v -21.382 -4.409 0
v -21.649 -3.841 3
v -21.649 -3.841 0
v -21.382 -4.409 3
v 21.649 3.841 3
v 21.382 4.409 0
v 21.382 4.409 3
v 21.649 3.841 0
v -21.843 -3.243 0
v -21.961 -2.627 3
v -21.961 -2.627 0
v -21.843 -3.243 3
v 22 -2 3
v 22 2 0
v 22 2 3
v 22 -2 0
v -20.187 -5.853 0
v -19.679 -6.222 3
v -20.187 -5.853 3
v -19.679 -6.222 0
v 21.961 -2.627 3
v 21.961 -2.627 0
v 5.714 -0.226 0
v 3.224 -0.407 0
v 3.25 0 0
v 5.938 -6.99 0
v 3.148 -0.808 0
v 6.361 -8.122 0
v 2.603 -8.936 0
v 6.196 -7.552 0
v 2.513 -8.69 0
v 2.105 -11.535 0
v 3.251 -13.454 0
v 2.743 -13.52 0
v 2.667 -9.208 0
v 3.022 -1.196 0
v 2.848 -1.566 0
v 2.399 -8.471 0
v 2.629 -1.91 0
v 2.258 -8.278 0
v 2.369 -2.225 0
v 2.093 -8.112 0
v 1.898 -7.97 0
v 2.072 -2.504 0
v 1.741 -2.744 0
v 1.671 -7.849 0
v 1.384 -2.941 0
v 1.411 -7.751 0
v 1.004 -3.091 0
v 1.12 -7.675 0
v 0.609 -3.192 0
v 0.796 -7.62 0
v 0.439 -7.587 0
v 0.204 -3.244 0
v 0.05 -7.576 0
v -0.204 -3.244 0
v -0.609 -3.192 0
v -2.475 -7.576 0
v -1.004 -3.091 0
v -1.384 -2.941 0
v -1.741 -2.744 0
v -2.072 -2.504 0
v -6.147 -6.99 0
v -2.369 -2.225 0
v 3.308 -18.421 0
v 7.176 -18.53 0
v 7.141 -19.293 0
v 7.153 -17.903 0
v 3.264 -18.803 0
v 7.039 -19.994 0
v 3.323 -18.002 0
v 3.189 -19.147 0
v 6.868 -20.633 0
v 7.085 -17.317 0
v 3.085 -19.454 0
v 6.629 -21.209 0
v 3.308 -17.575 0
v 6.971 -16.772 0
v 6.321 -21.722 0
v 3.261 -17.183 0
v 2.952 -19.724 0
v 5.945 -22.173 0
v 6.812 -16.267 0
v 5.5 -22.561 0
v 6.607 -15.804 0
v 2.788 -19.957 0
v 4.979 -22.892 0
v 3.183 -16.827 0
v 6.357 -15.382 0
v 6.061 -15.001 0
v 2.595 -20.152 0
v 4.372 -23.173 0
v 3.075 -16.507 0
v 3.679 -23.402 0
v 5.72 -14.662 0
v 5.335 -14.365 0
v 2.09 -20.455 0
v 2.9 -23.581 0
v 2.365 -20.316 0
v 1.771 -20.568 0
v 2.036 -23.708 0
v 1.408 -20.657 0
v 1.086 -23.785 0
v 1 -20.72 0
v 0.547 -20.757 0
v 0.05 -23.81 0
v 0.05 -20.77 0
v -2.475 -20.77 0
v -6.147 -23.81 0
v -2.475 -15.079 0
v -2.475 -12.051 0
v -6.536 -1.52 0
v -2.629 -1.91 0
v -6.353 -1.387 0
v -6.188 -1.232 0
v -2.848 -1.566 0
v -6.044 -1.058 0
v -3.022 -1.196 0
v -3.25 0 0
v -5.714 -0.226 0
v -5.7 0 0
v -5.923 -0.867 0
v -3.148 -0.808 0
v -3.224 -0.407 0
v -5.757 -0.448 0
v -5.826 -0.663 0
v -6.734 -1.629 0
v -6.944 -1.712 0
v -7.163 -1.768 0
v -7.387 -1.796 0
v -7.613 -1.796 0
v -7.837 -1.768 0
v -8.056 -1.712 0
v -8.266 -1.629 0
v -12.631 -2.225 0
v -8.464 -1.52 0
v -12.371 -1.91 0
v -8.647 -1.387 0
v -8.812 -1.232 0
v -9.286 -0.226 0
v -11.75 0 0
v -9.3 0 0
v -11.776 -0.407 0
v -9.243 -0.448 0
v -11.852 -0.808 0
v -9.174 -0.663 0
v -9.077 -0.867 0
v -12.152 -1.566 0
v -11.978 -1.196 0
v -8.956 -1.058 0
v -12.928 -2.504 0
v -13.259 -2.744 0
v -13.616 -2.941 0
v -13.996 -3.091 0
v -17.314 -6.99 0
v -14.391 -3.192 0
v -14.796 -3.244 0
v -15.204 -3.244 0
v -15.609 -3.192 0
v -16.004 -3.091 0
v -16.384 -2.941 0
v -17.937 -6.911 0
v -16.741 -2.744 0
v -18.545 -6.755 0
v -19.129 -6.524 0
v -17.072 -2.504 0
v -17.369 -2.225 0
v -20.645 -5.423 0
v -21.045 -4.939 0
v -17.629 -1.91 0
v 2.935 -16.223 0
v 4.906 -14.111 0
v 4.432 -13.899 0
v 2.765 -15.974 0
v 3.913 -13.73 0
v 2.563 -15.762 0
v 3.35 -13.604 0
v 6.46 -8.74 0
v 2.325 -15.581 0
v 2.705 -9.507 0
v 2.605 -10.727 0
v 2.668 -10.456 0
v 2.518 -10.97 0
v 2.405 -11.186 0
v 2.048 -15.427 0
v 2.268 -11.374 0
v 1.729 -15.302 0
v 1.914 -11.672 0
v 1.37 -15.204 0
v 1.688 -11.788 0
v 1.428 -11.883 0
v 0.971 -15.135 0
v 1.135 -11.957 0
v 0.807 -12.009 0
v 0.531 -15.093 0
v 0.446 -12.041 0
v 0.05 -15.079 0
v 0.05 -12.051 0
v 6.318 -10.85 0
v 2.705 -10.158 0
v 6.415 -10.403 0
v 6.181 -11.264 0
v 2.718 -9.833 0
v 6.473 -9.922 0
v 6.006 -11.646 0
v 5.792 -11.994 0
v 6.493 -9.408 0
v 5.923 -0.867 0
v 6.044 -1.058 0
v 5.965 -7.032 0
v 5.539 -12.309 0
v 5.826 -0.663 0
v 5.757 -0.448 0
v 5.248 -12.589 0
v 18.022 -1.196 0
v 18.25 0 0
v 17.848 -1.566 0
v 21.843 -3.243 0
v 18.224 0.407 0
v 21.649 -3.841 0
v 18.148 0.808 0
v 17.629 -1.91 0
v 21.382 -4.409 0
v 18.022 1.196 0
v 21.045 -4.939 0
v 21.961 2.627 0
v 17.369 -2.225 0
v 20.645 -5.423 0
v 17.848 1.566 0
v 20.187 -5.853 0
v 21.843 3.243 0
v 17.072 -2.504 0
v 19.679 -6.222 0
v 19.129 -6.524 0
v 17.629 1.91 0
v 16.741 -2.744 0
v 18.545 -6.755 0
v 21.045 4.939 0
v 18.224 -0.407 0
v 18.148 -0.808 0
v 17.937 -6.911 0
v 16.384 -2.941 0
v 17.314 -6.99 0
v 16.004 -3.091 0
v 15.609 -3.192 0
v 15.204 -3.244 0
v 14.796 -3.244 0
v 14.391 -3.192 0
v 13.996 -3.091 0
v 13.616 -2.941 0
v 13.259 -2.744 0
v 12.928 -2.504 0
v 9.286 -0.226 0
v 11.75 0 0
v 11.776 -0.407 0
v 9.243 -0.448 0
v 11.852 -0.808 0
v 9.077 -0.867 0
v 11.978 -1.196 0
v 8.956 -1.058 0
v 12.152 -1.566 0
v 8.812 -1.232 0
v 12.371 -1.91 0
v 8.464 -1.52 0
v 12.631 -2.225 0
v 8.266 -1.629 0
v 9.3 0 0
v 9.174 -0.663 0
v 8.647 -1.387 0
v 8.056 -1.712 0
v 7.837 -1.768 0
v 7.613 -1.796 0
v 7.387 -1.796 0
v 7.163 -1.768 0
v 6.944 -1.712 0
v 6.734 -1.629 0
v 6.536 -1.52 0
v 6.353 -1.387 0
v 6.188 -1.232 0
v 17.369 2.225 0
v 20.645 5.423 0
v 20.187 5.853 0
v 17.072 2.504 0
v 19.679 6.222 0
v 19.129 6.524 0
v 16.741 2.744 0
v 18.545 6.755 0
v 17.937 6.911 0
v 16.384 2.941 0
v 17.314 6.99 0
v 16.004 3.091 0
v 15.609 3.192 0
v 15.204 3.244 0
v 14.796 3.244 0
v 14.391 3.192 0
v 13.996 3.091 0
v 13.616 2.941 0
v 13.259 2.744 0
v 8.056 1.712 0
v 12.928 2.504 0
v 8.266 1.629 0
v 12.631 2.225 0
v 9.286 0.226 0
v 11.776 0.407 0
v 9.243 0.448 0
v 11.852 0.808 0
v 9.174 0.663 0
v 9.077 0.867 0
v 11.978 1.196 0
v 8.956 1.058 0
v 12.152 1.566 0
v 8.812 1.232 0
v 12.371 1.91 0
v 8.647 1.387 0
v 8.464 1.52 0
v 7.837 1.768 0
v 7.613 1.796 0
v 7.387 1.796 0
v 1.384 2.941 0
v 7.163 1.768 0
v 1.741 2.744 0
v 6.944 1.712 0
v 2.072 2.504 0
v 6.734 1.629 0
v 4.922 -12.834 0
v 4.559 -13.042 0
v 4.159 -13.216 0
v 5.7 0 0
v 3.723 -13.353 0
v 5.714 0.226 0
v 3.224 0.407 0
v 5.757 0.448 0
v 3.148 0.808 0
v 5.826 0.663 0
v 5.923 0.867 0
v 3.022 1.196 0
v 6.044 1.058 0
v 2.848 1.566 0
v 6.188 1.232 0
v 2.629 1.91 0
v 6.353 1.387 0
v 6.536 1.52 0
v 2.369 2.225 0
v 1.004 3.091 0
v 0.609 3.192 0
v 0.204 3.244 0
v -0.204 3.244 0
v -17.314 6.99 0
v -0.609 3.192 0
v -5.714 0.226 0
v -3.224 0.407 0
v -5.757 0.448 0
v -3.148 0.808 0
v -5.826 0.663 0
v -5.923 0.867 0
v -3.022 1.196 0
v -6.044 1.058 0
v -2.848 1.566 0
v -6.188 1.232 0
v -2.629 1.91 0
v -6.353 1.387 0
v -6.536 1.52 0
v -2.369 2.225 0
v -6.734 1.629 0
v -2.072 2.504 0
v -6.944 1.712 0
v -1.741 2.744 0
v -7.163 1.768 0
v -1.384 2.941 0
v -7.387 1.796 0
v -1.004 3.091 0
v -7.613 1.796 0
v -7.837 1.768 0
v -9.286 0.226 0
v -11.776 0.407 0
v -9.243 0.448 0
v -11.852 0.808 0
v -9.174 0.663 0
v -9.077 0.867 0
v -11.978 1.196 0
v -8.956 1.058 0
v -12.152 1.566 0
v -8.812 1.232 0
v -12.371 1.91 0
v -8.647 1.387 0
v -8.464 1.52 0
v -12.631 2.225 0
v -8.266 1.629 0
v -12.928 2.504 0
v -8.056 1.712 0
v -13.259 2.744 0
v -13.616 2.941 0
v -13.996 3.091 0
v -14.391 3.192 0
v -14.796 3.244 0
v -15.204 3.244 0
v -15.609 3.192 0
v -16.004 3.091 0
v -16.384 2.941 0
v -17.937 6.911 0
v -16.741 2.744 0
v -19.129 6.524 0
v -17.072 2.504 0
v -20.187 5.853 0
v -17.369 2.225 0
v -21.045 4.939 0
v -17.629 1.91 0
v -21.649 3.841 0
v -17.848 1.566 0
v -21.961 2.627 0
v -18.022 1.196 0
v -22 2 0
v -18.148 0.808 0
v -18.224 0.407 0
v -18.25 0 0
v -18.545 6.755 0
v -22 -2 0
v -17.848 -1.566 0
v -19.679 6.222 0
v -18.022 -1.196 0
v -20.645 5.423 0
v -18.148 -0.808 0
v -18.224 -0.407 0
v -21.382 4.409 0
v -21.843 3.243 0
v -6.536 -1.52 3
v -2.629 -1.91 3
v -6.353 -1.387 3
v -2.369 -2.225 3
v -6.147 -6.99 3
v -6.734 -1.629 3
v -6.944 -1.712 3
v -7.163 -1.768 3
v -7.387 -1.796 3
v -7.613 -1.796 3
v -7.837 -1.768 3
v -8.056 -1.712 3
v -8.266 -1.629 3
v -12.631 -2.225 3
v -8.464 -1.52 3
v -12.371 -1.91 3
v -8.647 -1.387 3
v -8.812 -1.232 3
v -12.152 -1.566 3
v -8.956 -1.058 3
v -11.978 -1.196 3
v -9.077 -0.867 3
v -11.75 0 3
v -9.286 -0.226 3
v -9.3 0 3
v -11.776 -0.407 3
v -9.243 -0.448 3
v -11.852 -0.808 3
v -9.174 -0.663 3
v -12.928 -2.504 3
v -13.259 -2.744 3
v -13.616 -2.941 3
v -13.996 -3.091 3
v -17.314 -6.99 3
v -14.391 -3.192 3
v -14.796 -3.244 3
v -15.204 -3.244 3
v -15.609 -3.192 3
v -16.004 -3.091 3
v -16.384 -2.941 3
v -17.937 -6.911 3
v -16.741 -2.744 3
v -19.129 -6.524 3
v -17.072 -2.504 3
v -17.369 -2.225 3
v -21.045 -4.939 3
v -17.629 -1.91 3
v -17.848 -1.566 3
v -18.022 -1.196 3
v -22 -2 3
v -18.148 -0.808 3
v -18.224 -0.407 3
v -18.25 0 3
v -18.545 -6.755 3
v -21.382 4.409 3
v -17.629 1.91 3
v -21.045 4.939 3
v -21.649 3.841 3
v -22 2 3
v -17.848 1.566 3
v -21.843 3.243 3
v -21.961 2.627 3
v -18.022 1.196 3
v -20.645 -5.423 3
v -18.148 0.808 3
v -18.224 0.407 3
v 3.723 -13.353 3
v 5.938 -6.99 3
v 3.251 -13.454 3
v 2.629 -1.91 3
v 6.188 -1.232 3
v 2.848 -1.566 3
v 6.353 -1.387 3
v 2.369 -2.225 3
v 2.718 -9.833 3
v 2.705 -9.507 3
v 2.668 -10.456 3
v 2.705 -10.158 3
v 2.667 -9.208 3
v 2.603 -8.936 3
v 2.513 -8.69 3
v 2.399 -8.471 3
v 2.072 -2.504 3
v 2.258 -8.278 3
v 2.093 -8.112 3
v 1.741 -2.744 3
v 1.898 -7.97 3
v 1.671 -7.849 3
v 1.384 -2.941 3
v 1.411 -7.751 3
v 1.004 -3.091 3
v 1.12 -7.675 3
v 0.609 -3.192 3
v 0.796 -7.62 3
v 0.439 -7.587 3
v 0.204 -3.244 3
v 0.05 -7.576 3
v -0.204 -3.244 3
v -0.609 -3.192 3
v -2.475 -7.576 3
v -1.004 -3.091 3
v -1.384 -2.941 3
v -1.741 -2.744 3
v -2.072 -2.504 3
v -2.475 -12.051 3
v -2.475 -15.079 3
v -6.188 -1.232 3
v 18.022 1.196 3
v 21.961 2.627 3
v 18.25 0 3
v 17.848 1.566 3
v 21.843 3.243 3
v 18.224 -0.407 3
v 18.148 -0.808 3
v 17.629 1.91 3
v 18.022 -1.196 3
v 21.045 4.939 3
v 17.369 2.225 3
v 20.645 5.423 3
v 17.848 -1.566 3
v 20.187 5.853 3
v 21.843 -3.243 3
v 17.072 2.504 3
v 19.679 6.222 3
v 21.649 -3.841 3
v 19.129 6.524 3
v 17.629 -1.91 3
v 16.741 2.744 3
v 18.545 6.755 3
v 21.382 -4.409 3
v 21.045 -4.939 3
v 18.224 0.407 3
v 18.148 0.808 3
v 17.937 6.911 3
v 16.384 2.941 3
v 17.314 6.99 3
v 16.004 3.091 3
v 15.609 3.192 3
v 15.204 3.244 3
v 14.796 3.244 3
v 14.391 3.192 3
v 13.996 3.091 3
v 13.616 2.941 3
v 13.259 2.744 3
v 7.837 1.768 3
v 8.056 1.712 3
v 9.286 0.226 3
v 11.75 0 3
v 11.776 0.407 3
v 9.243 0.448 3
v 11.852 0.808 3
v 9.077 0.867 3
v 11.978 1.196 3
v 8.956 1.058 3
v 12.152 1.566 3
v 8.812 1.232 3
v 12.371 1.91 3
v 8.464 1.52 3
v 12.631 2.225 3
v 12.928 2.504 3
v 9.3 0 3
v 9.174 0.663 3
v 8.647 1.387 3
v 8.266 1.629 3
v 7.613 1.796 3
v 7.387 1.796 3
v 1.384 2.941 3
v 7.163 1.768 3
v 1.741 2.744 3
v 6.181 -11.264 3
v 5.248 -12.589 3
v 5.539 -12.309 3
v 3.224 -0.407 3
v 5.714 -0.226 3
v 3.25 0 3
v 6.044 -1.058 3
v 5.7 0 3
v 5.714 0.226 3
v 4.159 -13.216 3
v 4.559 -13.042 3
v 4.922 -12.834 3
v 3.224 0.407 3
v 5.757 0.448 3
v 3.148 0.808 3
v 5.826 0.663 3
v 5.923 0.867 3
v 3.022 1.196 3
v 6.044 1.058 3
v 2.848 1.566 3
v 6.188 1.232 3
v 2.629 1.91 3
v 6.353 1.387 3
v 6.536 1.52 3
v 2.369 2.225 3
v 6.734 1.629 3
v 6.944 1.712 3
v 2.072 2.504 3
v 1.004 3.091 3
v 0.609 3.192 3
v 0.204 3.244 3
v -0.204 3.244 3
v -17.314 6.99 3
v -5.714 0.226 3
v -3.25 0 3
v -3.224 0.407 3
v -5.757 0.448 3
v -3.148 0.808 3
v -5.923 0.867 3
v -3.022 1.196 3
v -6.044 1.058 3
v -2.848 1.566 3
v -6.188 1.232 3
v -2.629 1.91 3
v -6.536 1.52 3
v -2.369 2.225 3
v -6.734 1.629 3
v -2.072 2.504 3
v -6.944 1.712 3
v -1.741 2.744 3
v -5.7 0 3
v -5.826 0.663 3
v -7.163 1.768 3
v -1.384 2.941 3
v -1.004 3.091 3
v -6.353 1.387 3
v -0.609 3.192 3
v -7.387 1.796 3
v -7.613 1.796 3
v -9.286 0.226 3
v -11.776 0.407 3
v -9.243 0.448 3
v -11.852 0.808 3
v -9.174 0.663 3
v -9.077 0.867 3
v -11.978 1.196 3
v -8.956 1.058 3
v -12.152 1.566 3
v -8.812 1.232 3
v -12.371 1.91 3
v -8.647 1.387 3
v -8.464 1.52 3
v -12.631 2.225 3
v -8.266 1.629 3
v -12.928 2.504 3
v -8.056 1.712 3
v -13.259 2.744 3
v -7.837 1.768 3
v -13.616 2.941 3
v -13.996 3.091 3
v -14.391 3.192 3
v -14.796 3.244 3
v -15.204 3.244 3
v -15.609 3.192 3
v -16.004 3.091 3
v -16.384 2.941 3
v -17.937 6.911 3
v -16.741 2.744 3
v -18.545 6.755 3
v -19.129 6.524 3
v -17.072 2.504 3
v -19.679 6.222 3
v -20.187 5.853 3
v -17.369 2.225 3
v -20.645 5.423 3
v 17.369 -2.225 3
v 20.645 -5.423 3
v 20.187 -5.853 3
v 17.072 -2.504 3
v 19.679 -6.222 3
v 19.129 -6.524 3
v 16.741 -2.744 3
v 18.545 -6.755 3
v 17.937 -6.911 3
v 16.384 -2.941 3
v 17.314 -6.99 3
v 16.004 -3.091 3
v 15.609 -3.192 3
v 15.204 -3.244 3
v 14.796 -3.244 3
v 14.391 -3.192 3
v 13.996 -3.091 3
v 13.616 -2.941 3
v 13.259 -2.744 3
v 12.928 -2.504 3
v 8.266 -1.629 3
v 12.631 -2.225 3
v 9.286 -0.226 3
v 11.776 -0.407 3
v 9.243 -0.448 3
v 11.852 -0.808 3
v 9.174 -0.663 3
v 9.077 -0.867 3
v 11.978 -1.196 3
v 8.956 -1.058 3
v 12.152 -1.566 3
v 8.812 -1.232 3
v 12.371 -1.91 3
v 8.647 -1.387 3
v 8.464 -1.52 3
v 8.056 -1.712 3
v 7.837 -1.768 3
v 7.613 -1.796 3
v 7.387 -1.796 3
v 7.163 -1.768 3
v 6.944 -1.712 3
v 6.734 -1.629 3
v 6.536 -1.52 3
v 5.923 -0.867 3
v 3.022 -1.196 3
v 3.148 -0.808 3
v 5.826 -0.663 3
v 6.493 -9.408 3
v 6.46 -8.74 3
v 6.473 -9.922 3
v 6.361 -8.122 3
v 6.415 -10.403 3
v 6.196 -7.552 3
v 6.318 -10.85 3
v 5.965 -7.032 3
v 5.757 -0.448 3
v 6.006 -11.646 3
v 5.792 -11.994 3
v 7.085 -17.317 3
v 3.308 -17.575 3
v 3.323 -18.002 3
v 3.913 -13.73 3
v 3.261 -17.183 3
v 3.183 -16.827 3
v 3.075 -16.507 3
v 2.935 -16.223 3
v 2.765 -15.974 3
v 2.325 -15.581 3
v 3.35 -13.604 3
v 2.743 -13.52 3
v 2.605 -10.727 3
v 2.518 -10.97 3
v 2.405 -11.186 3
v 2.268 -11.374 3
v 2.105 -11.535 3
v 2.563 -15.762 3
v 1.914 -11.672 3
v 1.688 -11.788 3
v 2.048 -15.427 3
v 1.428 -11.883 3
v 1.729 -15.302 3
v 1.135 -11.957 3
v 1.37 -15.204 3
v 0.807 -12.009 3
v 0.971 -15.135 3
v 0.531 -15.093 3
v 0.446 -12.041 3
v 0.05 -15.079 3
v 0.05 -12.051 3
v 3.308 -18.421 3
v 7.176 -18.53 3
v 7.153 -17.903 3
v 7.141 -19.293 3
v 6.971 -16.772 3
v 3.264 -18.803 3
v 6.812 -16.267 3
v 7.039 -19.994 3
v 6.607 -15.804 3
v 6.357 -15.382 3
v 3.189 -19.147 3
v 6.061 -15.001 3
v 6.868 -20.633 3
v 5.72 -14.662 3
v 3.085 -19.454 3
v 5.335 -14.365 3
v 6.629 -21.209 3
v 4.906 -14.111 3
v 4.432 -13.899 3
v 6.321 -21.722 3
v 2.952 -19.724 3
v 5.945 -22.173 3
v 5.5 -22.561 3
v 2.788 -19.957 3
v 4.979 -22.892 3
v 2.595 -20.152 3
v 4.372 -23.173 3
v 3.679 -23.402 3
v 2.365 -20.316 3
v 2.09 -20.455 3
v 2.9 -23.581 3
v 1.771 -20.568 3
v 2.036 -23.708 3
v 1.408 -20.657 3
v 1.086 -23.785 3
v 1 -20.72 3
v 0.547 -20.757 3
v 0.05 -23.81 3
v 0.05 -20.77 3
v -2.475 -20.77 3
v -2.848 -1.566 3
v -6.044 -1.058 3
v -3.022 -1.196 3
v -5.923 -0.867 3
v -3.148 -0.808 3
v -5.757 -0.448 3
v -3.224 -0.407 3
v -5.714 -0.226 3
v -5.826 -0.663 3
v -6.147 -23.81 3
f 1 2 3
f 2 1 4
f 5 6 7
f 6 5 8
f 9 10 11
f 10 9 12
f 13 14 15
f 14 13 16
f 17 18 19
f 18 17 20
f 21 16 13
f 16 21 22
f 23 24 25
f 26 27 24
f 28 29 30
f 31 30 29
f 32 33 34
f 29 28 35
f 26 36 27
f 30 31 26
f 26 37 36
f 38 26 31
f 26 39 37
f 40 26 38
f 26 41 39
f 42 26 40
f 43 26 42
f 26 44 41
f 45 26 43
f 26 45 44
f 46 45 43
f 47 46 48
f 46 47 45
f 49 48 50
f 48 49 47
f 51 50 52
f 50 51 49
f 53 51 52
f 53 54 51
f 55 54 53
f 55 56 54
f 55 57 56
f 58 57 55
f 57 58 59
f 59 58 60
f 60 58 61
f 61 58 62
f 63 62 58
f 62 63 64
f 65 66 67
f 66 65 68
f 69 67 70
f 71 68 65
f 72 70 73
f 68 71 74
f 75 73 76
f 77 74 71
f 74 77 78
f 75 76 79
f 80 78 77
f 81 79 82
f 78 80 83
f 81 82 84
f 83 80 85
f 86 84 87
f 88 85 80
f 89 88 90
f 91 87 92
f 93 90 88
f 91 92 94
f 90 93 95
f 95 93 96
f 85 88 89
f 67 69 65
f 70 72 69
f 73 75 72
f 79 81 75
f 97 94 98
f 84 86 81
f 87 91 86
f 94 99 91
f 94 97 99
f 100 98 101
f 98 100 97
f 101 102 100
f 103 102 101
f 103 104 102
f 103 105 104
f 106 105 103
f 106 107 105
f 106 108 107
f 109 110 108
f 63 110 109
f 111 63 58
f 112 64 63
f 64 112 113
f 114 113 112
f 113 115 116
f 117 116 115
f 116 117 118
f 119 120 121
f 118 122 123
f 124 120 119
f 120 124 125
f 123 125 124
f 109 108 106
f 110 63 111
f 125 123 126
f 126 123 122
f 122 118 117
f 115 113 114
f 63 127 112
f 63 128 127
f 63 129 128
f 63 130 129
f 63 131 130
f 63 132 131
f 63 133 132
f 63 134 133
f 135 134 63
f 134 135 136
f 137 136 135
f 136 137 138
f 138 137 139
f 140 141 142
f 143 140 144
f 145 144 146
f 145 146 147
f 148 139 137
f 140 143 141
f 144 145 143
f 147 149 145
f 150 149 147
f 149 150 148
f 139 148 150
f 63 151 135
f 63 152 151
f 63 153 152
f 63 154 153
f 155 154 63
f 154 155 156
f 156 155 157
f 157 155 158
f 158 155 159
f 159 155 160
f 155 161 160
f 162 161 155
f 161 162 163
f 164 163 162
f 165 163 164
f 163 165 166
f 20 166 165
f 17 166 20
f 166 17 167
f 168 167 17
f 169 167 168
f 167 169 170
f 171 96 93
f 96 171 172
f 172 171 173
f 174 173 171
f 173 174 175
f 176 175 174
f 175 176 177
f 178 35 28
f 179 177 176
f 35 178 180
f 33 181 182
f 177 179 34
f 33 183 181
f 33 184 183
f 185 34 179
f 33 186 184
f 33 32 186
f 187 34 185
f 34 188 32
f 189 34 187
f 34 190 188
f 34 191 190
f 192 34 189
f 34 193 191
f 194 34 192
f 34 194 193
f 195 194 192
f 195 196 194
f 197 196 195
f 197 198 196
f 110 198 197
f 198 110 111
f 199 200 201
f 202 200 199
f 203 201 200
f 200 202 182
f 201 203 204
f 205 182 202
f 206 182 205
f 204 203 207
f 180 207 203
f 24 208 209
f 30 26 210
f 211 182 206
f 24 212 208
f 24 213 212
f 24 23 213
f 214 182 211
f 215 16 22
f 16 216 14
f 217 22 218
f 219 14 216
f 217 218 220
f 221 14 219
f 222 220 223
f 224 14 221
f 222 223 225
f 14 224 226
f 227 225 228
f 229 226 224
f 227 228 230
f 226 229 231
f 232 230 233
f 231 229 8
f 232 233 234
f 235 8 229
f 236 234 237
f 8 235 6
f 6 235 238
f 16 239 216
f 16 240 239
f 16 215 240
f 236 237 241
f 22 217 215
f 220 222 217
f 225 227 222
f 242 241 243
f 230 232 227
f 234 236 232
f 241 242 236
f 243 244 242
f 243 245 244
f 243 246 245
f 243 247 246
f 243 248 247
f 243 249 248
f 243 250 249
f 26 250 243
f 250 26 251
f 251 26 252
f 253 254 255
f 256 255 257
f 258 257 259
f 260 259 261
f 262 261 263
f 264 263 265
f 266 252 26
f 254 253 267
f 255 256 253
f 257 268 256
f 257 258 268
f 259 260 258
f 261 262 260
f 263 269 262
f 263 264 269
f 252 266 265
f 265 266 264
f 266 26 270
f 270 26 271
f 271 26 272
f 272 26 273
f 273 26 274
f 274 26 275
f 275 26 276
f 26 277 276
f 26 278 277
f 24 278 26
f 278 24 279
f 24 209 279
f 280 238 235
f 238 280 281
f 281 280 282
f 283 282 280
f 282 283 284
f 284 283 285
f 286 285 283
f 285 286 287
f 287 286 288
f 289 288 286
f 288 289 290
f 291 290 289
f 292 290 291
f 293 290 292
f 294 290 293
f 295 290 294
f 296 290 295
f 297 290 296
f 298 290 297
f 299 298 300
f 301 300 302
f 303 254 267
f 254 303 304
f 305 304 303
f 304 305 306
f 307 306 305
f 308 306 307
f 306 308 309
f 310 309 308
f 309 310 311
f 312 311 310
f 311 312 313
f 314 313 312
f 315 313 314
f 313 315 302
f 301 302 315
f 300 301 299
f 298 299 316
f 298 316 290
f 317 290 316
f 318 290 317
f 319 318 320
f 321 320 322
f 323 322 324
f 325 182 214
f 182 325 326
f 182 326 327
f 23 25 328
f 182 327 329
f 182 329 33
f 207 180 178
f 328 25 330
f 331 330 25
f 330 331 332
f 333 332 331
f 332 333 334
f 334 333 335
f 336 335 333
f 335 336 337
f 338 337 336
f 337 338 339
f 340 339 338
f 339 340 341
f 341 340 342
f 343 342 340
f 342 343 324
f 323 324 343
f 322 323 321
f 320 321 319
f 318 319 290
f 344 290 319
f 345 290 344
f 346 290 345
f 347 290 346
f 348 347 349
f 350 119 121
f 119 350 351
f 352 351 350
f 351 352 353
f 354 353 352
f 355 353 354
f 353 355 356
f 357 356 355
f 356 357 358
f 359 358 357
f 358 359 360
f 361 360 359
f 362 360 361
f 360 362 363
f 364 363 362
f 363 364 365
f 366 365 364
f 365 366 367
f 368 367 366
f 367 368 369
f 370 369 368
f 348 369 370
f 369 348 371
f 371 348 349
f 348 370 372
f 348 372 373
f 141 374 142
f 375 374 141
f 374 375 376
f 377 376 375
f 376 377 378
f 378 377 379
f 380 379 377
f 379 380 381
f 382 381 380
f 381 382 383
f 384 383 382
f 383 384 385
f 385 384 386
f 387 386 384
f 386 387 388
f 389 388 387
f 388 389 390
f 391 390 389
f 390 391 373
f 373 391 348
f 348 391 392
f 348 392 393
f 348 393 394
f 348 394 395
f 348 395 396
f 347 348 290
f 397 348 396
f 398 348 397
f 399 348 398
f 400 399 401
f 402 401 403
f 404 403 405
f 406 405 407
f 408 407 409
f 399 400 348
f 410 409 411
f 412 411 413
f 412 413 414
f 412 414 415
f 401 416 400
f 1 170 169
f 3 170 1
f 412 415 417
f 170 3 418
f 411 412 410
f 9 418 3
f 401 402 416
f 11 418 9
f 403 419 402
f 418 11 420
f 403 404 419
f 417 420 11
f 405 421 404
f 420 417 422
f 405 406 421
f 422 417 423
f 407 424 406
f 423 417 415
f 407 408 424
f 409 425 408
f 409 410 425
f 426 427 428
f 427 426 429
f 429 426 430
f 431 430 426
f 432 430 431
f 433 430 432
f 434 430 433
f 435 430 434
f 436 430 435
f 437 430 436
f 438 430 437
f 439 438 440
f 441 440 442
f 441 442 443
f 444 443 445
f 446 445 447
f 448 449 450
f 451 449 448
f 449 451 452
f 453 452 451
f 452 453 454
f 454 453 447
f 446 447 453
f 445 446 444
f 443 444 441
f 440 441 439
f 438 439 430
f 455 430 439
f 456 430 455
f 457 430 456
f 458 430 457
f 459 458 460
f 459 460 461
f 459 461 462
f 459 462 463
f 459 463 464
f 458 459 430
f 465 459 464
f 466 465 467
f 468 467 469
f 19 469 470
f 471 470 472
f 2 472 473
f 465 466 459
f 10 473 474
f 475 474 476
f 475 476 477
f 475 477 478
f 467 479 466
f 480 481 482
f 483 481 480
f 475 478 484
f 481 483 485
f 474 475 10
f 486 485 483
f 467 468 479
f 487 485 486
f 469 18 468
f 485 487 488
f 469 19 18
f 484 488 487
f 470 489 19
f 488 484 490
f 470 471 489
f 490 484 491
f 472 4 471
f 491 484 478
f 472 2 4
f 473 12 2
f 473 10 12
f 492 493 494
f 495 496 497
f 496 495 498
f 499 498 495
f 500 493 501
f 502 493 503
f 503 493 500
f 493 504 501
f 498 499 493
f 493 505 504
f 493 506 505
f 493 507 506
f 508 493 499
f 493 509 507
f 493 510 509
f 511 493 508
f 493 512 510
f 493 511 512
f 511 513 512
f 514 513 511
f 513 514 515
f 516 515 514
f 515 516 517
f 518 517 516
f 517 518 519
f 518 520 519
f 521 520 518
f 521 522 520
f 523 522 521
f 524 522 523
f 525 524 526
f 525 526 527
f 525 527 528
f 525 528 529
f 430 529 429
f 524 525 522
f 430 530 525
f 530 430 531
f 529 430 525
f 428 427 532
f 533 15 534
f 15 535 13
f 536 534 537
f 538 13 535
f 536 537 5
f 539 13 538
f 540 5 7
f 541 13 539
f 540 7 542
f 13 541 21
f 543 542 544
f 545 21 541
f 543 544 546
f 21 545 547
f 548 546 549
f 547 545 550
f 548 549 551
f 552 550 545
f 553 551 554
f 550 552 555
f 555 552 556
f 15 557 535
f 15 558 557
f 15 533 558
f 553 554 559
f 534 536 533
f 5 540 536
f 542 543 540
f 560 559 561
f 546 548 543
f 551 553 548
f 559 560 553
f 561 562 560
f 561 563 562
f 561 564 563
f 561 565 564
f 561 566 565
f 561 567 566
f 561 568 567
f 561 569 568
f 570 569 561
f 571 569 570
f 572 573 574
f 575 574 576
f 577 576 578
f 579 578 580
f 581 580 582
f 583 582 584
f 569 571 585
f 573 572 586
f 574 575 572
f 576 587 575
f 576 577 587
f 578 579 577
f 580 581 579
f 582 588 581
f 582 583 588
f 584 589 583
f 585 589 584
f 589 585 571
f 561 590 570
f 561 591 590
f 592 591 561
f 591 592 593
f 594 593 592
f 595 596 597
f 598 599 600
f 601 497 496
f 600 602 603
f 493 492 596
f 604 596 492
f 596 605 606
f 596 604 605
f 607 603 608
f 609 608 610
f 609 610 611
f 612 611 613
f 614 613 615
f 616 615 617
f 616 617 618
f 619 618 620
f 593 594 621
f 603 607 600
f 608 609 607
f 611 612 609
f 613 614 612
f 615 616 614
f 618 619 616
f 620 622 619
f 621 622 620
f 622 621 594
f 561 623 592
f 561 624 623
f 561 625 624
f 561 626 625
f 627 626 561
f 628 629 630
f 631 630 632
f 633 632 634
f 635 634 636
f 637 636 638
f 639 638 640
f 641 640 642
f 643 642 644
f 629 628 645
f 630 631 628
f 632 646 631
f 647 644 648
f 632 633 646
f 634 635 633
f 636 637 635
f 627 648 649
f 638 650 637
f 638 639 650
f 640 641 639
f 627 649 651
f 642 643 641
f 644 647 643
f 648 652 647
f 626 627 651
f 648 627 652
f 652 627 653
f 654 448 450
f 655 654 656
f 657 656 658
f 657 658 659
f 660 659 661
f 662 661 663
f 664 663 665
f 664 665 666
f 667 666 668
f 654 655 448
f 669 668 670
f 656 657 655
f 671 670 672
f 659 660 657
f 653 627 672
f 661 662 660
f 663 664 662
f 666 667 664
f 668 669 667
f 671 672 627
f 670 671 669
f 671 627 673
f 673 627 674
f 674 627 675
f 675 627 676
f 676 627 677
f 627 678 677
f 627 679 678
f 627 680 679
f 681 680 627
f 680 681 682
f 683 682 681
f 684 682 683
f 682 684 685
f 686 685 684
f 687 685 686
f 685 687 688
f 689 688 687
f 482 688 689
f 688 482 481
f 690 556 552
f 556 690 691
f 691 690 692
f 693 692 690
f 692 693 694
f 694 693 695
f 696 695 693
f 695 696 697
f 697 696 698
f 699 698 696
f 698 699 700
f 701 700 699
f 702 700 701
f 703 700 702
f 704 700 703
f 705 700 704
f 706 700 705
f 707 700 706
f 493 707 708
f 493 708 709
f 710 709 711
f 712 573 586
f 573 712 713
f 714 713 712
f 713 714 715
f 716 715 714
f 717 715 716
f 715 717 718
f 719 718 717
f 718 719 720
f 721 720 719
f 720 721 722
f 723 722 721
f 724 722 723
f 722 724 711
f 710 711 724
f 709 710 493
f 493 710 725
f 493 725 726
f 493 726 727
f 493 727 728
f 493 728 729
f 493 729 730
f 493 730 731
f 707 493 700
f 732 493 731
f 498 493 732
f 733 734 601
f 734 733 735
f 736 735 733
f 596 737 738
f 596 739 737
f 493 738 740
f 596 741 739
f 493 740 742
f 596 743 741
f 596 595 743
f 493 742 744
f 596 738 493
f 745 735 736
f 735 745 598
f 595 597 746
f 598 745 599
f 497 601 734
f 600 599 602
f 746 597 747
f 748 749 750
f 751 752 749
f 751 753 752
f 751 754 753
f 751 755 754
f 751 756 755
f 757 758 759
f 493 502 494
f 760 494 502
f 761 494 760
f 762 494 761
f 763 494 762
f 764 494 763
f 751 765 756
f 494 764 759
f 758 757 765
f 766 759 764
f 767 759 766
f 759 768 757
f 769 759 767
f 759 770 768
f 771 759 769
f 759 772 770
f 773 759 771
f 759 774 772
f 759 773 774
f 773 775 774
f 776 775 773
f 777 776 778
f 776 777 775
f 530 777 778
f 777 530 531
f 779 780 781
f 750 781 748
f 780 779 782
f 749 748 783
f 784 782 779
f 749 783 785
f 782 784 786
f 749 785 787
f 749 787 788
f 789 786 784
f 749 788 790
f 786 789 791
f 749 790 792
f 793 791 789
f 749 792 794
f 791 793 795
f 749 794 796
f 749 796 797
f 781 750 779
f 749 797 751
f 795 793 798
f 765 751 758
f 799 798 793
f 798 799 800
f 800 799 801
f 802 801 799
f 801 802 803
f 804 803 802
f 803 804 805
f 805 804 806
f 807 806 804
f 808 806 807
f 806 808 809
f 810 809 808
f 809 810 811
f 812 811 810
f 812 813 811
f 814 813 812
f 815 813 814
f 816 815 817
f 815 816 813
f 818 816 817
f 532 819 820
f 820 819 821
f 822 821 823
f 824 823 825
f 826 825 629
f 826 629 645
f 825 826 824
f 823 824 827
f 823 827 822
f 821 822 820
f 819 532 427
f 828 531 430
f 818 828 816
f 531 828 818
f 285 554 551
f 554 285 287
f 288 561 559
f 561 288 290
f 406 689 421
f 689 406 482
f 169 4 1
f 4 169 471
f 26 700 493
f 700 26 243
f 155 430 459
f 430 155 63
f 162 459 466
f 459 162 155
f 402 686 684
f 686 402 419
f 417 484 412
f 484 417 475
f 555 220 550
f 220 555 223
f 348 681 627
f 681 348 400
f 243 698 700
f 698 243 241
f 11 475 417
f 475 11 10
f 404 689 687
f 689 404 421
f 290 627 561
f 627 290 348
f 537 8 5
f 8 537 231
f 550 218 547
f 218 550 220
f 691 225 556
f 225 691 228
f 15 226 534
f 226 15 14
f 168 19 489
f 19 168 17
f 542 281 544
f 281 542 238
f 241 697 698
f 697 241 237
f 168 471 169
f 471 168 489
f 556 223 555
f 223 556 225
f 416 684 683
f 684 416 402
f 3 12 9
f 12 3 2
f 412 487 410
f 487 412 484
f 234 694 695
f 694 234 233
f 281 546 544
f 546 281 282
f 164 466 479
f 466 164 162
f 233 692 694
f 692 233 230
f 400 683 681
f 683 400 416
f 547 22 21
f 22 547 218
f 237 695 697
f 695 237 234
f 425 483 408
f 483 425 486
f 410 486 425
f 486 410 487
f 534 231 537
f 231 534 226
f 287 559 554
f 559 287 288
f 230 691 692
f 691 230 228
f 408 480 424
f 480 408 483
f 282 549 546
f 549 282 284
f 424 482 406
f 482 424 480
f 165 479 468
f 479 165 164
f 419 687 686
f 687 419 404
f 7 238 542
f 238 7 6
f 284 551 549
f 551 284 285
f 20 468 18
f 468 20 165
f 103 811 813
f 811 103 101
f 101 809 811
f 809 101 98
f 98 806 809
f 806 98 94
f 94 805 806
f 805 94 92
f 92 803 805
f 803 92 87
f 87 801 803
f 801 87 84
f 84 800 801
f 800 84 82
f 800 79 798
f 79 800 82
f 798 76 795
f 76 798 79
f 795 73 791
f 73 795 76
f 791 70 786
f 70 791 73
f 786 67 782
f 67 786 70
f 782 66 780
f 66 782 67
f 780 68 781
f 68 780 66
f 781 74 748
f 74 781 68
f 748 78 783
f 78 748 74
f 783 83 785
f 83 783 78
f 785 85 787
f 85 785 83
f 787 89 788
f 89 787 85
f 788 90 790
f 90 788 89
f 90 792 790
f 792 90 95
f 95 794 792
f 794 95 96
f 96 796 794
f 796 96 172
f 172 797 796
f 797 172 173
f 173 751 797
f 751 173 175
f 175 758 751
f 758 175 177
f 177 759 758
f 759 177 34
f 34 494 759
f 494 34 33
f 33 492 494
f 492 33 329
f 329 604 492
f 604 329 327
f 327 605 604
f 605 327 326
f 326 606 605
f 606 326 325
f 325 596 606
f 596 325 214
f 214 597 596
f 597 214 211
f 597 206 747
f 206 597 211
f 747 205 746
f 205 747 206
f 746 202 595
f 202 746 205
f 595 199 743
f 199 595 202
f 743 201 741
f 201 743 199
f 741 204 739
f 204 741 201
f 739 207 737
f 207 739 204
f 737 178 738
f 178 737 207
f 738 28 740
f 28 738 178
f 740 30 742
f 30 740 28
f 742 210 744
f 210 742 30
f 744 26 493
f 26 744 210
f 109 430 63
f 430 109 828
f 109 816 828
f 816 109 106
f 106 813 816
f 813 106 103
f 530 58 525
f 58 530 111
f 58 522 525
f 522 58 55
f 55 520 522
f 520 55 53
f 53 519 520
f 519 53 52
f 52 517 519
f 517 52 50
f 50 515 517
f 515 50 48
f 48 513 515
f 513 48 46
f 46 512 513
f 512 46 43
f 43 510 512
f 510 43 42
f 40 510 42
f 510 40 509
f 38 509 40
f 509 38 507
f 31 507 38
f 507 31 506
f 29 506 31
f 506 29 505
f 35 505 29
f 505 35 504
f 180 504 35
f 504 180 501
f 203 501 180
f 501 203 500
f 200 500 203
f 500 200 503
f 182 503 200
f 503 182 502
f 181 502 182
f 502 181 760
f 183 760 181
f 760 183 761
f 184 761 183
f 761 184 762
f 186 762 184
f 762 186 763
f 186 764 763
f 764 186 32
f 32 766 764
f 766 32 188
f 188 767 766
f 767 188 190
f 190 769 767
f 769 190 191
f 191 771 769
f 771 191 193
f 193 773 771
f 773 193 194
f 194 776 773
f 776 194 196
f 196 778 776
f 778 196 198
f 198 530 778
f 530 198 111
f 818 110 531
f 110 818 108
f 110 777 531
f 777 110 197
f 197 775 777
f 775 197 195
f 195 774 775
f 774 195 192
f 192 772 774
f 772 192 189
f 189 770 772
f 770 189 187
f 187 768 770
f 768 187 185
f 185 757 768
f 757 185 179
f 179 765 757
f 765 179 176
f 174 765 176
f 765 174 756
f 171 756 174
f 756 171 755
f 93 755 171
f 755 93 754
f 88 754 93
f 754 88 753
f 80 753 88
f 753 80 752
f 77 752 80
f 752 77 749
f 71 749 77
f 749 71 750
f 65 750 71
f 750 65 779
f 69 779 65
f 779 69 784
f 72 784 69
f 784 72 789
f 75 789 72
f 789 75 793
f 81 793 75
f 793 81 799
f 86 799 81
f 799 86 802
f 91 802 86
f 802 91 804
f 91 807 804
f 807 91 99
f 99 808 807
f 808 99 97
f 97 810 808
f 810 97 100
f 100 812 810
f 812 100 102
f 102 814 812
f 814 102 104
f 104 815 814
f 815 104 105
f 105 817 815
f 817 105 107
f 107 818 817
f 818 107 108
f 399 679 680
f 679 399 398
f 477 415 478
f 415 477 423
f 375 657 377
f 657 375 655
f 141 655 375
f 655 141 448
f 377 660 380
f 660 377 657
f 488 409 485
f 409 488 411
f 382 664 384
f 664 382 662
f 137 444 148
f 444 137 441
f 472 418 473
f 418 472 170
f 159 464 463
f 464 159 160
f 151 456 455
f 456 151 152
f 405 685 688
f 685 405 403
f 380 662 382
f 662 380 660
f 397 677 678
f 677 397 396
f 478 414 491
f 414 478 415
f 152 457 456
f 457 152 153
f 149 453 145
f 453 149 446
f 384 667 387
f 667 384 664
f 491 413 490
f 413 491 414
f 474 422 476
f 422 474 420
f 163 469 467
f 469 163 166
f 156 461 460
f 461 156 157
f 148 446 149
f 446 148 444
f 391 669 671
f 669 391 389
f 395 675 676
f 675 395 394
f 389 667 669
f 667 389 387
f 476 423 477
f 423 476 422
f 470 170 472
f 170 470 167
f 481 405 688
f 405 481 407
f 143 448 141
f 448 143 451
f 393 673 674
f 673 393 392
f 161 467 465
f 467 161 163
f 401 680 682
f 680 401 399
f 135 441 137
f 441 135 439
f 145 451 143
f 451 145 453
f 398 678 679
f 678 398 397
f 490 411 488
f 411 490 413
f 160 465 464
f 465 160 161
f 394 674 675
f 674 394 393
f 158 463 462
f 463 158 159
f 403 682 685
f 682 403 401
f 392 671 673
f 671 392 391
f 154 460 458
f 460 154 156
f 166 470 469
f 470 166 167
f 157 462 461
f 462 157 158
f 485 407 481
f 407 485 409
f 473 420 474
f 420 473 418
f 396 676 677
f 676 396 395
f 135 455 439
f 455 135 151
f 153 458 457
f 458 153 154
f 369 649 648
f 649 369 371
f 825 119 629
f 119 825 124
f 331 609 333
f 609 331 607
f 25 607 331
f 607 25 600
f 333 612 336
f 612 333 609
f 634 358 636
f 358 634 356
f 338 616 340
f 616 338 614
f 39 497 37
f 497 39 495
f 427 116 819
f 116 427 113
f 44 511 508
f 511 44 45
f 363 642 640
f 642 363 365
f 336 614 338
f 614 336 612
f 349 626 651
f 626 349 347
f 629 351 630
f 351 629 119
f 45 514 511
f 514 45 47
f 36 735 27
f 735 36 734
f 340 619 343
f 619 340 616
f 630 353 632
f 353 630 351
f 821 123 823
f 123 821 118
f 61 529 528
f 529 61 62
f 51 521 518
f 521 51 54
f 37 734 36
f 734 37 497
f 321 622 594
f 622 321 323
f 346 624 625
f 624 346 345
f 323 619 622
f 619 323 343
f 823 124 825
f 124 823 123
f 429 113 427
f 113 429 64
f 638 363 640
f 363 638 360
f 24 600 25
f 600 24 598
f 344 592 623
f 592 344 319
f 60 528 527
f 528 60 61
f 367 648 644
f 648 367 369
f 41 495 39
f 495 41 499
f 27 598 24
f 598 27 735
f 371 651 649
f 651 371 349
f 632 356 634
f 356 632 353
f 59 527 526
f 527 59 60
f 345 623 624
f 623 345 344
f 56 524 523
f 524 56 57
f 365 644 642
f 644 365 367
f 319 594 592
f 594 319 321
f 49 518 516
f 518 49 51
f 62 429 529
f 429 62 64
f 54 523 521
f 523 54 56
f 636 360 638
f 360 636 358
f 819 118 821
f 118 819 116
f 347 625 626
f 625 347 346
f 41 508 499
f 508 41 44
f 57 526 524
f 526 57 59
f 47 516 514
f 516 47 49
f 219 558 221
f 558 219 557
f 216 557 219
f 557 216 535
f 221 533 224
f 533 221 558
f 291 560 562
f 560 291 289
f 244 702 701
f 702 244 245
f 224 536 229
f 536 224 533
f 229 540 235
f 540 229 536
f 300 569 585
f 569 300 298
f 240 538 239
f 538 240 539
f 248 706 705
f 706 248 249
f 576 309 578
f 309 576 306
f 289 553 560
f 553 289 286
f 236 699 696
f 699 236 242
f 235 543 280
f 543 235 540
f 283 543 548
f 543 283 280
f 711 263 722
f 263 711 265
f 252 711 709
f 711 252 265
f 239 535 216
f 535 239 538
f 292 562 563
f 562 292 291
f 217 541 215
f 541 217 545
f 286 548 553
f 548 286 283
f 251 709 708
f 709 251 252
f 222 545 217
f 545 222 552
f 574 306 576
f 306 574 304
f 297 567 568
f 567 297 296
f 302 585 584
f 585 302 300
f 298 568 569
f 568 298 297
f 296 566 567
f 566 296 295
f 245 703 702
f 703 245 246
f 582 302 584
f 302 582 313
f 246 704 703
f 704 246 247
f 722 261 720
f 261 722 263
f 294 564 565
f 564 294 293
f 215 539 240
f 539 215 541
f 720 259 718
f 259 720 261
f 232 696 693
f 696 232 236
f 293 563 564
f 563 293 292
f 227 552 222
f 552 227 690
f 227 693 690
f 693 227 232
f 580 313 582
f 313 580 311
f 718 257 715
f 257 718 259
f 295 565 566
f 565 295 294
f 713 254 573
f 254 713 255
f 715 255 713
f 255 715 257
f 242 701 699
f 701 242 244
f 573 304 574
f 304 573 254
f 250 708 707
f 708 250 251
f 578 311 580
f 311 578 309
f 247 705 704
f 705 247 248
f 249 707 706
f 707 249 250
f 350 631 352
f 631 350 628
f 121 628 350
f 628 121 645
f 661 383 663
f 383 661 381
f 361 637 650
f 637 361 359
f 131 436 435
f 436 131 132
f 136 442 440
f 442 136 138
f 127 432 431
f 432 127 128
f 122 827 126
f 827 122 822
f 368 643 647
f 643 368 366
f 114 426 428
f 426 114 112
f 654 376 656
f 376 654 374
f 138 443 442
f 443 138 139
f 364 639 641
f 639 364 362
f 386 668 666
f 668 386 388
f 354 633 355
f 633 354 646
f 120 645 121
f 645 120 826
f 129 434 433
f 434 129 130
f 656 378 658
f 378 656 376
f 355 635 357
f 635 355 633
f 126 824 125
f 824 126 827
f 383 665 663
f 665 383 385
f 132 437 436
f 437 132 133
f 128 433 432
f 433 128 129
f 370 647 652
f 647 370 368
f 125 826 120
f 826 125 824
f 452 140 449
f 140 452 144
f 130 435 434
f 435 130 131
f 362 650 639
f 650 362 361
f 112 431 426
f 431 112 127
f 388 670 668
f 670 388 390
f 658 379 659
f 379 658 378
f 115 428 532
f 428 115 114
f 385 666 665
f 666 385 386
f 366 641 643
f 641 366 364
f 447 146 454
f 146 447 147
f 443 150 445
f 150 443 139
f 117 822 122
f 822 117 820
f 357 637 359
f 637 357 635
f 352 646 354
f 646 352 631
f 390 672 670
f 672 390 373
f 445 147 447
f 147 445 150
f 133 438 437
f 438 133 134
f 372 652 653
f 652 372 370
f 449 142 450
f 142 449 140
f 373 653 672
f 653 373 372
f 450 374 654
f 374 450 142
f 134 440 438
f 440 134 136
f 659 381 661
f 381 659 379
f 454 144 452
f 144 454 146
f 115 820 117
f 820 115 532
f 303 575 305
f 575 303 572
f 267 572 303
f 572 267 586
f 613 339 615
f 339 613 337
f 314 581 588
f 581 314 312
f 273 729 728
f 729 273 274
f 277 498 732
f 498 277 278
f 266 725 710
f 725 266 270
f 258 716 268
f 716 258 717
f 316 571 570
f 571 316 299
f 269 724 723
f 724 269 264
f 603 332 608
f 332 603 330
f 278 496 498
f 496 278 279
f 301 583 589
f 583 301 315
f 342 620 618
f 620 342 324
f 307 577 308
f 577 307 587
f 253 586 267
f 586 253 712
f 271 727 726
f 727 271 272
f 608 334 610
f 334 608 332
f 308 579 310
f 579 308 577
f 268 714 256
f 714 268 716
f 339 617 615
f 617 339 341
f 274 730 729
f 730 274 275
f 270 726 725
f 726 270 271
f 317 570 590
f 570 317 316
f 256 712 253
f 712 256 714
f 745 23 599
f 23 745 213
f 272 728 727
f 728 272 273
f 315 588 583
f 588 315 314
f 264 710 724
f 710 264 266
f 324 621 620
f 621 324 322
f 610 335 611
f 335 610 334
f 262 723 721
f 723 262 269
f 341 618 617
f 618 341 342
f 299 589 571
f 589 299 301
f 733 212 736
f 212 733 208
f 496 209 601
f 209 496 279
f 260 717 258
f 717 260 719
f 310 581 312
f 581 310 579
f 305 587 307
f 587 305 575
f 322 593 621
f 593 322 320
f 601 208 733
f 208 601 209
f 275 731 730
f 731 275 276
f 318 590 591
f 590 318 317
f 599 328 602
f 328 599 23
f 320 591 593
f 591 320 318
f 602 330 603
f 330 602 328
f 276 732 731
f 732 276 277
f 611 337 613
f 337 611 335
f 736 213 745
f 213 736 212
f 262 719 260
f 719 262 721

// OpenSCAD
$fn = 50;


difference() {
	union() {
		hull() {
			translate(v = [-17.0000000000, 2.0000000000, 0]) {
				cylinder(h = 3, r = 5);
			}
			translate(v = [17.0000000000, 2.0000000000, 0]) {
				cylinder(h = 3, r = 5);
			}
			translate(v = [-17.0000000000, -2.0000000000, 0]) {
				cylinder(h = 3, r = 5);
			}
			translate(v = [17.0000000000, -2.0000000000, 0]) {
				cylinder(h = 3, r = 5);
			}
		}
		translate(v = [0, -5, 0]) {
			linear_extrude(height = 3) {
				text(font = "DejaVu Sans Mono:style=Bold", halign = "center", size = 19.0000000000, text = "B", valign = "top");
			}
		}
	}
	union() {
		translate(v = [-15.0000000000, 0.0000000000, 0]) {
			translate(v = [0, 0, -100]) {
				cylinder(h = 200, r = 3.2500000000);
			}
		}
		translate(v = [0, 0, -100]) {
			cylinder(h = 200, r = 3.2500000000);
		}
		translate(v = [15.0000000000, 0.0000000000, 0]) {
			translate(v = [0, 0, -100]) {
				cylinder(h = 200, r = 3.2500000000);
			}
		}
		translate(v = [-15.0000000000, 0.0000000000, 0]) {
			translate(v = [0, 0, -100]) {
				cylinder(h = 200, r = 1.8000000000);
			}
		}
		translate(v = [-7.5000000000, 0.0000000000, 0]) {
			translate(v = [0, 0, -100]) {
				cylinder(h = 200, r = 1.8000000000);
			}
		}
		translate(v = [0, 0, -100]) {
			cylinder(h = 200, r = 1.8000000000);
		}
		translate(v = [7.5000000000, 0.0000000000, 0]) {
			translate(v = [0, 0, -100]) {
				cylinder(h = 200, r = 1.8000000000);
			}
		}
		translate(v = [15.0000000000, 0.0000000000, 0]) {
			translate(v = [0, 0, -100]) {
				cylinder(h = 200, r = 1.8000000000);
			}
		}
	}
}
